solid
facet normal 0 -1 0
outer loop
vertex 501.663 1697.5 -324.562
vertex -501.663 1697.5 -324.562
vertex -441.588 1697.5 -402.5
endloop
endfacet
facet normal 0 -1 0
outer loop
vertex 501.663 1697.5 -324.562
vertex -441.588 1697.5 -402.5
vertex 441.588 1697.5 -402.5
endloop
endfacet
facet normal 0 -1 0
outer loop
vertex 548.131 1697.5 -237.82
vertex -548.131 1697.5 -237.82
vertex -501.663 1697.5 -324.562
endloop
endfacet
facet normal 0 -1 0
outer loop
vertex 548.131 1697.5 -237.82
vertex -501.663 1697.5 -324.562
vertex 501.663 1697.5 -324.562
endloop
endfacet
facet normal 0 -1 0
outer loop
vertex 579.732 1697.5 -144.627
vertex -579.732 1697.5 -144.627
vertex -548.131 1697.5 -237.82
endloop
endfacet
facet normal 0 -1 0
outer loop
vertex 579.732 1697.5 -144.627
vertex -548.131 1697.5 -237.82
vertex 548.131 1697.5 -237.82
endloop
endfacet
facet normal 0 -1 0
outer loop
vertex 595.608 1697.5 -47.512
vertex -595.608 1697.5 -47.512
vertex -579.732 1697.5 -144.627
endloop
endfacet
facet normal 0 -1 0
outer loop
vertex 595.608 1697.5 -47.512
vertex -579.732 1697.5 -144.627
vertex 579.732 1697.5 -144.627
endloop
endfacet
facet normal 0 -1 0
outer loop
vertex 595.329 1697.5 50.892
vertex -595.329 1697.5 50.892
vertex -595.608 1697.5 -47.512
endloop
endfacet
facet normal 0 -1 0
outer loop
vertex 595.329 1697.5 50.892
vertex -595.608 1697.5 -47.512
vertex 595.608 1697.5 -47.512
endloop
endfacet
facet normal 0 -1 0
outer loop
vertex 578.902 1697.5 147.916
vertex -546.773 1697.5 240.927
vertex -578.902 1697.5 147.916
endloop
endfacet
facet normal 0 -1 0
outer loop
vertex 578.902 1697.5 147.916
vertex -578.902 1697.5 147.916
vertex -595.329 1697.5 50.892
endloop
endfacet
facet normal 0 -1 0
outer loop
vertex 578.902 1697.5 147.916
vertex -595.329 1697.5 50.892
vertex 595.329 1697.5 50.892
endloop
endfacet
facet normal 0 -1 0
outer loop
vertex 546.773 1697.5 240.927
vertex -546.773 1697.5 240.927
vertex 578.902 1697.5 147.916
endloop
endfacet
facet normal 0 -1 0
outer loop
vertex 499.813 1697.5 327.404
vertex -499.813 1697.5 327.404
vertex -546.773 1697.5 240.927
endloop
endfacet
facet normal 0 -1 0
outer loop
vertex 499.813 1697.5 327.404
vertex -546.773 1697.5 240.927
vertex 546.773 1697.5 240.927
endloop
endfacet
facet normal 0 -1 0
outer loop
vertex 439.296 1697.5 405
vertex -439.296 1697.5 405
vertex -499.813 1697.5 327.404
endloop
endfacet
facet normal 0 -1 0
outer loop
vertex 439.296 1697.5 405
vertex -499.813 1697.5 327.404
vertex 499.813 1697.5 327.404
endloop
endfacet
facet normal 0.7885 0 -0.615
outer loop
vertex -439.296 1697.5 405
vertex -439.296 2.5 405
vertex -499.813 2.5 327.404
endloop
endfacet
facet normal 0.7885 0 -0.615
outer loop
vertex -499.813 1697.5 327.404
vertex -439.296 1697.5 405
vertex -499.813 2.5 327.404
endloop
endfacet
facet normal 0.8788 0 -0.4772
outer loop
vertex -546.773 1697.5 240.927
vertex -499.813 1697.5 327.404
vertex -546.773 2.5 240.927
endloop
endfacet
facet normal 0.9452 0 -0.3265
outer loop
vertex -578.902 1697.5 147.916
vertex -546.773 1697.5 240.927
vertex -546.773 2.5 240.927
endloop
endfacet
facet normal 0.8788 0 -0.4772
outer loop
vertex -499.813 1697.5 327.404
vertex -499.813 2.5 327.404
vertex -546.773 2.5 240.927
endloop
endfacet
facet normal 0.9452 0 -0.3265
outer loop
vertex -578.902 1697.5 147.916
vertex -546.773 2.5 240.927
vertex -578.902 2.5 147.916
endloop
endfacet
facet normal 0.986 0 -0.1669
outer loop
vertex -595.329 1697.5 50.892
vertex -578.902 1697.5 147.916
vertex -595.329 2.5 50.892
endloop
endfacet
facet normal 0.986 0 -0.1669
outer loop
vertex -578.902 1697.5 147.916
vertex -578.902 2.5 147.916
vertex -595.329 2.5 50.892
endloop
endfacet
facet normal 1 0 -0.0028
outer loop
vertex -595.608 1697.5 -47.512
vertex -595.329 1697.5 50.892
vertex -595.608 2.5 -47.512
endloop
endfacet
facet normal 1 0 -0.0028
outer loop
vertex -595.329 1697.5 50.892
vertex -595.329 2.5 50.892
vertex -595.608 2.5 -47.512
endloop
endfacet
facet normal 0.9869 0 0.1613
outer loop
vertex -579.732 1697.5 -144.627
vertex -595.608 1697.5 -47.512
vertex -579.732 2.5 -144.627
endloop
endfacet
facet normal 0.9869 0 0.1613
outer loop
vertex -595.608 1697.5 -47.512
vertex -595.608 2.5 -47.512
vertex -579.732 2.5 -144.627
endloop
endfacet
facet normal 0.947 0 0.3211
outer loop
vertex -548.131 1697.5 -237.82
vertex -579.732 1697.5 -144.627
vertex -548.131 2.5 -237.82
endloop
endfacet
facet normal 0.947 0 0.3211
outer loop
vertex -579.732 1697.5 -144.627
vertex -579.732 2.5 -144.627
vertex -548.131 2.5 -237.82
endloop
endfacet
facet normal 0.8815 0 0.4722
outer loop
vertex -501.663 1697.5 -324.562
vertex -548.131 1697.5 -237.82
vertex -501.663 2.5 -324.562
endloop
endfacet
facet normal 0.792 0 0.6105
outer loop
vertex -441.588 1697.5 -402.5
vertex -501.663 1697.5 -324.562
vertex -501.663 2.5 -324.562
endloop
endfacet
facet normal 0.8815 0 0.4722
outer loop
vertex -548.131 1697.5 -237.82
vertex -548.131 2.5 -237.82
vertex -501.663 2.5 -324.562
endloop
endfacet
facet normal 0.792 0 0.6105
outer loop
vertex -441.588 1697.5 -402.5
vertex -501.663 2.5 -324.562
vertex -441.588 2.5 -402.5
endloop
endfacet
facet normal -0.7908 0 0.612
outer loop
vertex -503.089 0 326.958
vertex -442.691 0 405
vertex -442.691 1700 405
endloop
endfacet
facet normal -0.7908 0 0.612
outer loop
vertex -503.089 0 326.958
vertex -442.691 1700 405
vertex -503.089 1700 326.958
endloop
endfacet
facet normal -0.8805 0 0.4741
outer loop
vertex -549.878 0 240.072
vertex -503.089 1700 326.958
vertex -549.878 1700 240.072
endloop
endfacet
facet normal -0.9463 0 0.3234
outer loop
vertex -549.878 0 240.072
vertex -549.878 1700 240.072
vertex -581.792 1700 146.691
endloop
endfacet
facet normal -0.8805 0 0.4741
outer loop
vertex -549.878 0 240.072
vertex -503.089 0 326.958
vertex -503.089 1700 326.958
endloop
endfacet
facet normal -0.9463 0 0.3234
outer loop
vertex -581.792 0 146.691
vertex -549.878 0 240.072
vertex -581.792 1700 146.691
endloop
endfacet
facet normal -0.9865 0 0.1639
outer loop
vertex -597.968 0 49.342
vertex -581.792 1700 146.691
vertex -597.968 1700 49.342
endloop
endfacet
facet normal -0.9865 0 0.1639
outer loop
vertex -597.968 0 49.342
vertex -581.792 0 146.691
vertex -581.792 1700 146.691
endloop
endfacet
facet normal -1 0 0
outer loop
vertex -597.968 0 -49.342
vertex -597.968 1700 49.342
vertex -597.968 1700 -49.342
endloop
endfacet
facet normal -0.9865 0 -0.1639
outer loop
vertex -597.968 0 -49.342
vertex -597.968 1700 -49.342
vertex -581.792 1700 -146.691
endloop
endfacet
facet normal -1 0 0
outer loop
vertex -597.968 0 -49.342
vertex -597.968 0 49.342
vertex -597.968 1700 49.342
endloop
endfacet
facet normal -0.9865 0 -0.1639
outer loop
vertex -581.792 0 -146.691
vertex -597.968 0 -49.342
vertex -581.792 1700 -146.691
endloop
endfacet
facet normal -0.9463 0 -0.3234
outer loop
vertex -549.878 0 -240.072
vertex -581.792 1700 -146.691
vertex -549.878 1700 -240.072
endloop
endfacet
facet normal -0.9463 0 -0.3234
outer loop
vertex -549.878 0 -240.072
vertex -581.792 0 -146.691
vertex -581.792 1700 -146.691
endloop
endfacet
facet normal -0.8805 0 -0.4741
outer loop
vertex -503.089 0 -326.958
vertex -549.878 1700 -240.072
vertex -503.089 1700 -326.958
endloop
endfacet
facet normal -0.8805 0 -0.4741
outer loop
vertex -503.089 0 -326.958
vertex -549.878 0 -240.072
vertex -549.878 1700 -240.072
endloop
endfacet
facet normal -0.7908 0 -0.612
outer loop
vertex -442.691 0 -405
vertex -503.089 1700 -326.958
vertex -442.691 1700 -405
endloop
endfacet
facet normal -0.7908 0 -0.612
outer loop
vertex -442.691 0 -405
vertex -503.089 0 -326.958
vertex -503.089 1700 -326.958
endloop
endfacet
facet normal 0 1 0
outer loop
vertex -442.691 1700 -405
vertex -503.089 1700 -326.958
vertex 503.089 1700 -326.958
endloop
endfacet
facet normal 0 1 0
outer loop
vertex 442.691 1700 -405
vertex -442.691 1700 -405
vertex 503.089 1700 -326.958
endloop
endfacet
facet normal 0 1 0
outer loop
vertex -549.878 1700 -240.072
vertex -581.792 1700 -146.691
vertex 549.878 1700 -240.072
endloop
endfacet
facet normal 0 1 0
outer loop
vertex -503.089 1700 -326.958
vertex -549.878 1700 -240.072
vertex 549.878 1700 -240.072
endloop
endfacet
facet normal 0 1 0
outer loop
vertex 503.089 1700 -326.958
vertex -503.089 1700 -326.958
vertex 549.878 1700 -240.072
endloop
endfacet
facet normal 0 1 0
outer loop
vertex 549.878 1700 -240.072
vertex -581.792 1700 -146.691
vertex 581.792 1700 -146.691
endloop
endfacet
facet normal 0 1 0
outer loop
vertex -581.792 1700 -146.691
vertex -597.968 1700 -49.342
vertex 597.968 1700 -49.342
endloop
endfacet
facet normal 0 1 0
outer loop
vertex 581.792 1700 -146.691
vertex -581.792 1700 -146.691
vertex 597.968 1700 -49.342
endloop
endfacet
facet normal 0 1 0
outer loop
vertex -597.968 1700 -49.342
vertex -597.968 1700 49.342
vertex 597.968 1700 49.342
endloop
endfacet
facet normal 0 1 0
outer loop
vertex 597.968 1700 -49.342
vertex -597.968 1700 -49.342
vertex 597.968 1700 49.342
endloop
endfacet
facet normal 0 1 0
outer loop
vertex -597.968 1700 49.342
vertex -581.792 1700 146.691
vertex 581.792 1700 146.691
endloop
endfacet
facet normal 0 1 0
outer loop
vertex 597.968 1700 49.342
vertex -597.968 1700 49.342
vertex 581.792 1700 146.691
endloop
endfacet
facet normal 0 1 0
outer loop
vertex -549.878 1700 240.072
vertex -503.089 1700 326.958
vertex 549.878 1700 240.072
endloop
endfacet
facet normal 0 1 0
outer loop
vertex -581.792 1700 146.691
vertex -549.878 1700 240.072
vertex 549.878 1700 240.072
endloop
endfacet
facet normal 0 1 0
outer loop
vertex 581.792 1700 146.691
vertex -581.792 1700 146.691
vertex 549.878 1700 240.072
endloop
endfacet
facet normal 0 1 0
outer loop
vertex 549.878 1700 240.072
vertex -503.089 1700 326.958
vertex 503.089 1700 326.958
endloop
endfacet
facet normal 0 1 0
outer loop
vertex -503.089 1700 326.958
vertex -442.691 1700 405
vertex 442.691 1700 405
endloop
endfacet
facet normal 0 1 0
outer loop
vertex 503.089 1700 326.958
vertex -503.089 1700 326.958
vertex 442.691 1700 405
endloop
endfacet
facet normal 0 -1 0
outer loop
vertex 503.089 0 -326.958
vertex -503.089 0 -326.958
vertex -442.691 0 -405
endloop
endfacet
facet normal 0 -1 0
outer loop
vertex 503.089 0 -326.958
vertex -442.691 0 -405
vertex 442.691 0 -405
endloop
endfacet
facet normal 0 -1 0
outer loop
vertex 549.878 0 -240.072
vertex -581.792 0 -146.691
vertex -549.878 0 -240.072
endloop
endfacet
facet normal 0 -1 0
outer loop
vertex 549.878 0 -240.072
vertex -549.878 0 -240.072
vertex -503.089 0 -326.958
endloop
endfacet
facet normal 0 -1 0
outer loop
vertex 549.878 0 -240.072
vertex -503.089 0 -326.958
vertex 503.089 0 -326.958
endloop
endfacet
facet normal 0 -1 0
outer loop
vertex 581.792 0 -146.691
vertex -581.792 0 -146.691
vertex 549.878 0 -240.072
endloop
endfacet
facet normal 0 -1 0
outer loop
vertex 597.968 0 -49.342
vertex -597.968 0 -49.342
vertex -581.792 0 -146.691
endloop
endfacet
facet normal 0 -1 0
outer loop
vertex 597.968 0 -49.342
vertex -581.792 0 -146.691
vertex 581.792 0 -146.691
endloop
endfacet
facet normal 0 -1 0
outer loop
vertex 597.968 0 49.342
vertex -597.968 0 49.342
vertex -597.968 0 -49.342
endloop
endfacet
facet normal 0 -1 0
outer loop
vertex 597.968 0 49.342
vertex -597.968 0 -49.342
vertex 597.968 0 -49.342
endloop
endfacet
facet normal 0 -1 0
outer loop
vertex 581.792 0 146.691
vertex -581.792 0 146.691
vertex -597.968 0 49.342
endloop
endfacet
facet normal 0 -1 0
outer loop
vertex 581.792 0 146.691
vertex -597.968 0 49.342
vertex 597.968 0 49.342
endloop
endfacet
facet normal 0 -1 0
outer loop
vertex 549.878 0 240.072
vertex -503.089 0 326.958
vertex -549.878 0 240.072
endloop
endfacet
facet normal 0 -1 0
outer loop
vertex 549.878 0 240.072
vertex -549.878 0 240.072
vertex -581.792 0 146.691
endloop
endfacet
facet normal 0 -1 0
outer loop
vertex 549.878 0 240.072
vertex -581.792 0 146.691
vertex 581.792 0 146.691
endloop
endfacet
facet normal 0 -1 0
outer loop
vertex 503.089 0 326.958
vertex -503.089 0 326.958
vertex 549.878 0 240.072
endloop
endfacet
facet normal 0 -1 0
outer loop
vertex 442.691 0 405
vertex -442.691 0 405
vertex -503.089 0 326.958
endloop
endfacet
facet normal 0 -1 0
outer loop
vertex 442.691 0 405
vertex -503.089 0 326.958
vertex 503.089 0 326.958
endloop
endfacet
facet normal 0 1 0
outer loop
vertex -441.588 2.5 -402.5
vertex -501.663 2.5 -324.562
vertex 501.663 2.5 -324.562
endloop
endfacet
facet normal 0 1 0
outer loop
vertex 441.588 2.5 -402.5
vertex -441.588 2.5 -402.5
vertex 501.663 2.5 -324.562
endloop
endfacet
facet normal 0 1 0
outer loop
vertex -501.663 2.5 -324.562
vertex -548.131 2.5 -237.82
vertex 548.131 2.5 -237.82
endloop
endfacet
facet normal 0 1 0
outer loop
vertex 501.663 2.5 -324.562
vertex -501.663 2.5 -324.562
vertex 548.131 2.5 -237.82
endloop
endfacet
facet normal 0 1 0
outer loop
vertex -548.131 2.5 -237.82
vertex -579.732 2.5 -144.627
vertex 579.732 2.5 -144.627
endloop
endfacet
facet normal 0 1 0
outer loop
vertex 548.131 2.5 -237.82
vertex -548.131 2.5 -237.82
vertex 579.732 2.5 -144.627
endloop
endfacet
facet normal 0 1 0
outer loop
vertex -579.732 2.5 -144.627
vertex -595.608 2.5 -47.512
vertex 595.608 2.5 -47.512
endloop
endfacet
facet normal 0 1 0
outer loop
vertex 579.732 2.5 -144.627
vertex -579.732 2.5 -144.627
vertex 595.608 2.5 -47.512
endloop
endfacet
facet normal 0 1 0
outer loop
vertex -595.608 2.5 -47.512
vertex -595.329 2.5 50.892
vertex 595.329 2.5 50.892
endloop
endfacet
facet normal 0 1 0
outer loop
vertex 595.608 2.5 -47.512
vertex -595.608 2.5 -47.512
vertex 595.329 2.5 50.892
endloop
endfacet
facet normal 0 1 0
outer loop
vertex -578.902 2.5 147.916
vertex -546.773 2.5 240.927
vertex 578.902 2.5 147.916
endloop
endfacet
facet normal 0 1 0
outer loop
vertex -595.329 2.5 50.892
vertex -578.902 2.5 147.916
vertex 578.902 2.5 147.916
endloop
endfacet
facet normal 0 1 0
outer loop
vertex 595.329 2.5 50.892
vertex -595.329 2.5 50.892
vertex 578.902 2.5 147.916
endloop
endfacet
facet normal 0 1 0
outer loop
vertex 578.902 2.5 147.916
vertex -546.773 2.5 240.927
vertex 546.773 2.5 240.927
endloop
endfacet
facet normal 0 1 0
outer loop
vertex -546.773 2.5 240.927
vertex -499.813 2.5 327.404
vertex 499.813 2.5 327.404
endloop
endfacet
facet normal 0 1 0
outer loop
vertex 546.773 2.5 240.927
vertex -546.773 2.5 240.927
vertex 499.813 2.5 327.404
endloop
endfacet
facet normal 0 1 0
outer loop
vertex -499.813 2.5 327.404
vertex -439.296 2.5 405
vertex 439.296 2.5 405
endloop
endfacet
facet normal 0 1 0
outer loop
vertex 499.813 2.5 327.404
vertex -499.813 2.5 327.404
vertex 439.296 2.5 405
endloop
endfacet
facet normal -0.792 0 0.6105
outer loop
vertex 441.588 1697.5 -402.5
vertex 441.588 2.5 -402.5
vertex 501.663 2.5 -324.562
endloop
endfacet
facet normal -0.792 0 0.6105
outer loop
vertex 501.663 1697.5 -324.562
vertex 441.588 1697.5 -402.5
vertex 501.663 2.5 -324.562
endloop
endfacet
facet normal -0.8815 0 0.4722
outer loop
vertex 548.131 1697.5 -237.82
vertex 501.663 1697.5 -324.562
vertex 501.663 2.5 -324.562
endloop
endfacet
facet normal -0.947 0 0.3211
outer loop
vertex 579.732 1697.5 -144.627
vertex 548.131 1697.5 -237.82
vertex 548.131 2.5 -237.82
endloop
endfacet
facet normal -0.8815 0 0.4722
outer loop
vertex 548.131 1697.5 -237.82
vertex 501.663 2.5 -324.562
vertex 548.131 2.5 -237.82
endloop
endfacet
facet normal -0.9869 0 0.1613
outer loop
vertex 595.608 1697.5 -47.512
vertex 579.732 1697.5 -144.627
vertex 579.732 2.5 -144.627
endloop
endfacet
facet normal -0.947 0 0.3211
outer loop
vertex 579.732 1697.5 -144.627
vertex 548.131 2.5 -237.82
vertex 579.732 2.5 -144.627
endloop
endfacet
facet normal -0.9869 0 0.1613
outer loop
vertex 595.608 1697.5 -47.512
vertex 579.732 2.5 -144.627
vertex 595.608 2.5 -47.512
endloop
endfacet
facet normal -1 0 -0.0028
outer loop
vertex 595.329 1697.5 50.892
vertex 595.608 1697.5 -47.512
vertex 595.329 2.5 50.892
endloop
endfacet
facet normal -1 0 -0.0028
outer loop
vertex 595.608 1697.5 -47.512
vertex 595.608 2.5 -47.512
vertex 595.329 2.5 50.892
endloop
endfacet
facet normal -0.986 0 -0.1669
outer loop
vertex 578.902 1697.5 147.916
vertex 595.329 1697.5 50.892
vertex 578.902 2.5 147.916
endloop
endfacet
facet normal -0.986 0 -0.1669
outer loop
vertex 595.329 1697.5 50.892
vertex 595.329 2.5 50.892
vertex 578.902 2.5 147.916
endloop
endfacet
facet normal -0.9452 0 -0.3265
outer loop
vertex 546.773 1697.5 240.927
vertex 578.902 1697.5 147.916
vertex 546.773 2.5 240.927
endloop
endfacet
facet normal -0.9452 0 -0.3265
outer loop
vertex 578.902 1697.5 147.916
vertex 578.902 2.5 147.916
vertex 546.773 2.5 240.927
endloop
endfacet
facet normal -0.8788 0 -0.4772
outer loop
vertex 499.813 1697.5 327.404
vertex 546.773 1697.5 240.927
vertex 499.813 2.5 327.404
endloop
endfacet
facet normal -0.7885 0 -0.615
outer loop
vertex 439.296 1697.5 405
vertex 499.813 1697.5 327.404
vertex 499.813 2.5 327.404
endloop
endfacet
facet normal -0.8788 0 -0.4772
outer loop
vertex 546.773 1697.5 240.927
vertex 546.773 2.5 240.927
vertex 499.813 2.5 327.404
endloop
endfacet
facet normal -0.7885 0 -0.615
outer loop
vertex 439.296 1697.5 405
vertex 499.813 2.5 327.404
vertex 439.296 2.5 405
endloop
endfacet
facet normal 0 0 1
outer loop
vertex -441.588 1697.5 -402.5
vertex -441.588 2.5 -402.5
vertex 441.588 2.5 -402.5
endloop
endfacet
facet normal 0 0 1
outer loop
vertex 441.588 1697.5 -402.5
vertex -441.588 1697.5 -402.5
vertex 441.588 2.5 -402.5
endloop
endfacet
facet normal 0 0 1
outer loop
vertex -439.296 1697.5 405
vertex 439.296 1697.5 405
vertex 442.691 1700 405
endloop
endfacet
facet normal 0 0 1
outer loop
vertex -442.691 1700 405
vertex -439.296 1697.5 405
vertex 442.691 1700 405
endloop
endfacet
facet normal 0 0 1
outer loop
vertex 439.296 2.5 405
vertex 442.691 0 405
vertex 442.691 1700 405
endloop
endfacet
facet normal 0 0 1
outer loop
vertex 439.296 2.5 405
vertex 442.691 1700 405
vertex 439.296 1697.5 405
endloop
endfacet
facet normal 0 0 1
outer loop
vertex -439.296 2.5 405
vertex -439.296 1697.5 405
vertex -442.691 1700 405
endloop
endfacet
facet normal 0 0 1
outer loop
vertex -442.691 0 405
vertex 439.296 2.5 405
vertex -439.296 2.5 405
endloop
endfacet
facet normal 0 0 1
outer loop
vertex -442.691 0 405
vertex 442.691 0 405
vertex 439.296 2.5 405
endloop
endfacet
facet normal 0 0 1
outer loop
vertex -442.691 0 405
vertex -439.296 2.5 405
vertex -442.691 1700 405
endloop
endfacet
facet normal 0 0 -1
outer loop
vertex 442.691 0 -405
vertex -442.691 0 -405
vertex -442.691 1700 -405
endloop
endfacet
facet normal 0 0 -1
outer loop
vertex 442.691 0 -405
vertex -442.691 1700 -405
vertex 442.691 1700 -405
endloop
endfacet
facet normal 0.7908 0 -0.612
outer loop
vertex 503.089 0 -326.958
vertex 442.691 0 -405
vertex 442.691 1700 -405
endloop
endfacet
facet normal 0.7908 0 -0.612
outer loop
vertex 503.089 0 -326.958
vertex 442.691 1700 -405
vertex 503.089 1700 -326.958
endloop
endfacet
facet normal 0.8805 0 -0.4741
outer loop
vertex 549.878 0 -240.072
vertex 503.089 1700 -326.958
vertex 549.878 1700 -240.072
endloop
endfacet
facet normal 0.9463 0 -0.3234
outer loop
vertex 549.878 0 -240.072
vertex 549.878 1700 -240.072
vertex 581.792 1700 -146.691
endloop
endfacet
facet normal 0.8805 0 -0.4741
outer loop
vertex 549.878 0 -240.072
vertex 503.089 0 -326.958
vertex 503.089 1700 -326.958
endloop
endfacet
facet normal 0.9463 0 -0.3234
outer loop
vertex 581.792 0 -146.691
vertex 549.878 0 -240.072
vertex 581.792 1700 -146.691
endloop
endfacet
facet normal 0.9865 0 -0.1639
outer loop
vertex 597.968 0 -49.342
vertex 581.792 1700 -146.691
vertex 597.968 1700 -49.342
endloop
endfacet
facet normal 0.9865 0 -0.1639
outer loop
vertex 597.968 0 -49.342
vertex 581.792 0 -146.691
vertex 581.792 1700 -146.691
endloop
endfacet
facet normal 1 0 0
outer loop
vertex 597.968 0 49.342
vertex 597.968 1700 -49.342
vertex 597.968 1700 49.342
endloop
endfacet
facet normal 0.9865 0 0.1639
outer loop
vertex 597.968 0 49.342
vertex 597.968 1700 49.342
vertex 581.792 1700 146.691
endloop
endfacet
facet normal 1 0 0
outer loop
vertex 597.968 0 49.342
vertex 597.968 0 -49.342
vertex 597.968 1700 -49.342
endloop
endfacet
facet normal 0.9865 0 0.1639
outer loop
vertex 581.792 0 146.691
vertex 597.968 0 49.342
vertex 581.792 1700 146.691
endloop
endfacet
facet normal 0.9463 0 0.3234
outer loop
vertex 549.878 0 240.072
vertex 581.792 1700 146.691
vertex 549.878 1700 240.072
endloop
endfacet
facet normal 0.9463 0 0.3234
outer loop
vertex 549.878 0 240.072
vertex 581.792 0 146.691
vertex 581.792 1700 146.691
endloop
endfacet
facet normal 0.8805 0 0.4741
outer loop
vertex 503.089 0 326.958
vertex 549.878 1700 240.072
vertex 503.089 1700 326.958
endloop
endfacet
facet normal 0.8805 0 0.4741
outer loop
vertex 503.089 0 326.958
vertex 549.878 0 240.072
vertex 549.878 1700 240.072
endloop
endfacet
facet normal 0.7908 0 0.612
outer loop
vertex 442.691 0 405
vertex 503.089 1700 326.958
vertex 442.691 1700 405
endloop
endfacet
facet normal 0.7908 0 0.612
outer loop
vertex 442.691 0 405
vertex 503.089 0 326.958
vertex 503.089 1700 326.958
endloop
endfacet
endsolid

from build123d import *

# Parameters (mm, degrees)
F1_DEPTH = 1700
F2_T     = -2.5


with BuildPart() as f1:
    # F0 (on Front) → F1 (new body)
    with BuildSketch(Plane.XZ):
        with BuildLine():
            Line((442.690637, 405), (-442.690637, 405))
            ThreePointArc((-442.690637, 405), (-600, 0), (-442.690637, -405))
            Line((-442.690637, -405), (442.690637, -405))
            ThreePointArc((442.690637, -405), (600, 0), (442.690637, 405))
        make_face()
    extrude(amount=-F1_DEPTH)

    # F2
    f2_openings = [f1.faces().sort_by_distance(p)[0] for p in [
        (0, 850, 405),
    ]]
    offset(amount=F2_T, openings=f2_openings)


solid = f1.part
